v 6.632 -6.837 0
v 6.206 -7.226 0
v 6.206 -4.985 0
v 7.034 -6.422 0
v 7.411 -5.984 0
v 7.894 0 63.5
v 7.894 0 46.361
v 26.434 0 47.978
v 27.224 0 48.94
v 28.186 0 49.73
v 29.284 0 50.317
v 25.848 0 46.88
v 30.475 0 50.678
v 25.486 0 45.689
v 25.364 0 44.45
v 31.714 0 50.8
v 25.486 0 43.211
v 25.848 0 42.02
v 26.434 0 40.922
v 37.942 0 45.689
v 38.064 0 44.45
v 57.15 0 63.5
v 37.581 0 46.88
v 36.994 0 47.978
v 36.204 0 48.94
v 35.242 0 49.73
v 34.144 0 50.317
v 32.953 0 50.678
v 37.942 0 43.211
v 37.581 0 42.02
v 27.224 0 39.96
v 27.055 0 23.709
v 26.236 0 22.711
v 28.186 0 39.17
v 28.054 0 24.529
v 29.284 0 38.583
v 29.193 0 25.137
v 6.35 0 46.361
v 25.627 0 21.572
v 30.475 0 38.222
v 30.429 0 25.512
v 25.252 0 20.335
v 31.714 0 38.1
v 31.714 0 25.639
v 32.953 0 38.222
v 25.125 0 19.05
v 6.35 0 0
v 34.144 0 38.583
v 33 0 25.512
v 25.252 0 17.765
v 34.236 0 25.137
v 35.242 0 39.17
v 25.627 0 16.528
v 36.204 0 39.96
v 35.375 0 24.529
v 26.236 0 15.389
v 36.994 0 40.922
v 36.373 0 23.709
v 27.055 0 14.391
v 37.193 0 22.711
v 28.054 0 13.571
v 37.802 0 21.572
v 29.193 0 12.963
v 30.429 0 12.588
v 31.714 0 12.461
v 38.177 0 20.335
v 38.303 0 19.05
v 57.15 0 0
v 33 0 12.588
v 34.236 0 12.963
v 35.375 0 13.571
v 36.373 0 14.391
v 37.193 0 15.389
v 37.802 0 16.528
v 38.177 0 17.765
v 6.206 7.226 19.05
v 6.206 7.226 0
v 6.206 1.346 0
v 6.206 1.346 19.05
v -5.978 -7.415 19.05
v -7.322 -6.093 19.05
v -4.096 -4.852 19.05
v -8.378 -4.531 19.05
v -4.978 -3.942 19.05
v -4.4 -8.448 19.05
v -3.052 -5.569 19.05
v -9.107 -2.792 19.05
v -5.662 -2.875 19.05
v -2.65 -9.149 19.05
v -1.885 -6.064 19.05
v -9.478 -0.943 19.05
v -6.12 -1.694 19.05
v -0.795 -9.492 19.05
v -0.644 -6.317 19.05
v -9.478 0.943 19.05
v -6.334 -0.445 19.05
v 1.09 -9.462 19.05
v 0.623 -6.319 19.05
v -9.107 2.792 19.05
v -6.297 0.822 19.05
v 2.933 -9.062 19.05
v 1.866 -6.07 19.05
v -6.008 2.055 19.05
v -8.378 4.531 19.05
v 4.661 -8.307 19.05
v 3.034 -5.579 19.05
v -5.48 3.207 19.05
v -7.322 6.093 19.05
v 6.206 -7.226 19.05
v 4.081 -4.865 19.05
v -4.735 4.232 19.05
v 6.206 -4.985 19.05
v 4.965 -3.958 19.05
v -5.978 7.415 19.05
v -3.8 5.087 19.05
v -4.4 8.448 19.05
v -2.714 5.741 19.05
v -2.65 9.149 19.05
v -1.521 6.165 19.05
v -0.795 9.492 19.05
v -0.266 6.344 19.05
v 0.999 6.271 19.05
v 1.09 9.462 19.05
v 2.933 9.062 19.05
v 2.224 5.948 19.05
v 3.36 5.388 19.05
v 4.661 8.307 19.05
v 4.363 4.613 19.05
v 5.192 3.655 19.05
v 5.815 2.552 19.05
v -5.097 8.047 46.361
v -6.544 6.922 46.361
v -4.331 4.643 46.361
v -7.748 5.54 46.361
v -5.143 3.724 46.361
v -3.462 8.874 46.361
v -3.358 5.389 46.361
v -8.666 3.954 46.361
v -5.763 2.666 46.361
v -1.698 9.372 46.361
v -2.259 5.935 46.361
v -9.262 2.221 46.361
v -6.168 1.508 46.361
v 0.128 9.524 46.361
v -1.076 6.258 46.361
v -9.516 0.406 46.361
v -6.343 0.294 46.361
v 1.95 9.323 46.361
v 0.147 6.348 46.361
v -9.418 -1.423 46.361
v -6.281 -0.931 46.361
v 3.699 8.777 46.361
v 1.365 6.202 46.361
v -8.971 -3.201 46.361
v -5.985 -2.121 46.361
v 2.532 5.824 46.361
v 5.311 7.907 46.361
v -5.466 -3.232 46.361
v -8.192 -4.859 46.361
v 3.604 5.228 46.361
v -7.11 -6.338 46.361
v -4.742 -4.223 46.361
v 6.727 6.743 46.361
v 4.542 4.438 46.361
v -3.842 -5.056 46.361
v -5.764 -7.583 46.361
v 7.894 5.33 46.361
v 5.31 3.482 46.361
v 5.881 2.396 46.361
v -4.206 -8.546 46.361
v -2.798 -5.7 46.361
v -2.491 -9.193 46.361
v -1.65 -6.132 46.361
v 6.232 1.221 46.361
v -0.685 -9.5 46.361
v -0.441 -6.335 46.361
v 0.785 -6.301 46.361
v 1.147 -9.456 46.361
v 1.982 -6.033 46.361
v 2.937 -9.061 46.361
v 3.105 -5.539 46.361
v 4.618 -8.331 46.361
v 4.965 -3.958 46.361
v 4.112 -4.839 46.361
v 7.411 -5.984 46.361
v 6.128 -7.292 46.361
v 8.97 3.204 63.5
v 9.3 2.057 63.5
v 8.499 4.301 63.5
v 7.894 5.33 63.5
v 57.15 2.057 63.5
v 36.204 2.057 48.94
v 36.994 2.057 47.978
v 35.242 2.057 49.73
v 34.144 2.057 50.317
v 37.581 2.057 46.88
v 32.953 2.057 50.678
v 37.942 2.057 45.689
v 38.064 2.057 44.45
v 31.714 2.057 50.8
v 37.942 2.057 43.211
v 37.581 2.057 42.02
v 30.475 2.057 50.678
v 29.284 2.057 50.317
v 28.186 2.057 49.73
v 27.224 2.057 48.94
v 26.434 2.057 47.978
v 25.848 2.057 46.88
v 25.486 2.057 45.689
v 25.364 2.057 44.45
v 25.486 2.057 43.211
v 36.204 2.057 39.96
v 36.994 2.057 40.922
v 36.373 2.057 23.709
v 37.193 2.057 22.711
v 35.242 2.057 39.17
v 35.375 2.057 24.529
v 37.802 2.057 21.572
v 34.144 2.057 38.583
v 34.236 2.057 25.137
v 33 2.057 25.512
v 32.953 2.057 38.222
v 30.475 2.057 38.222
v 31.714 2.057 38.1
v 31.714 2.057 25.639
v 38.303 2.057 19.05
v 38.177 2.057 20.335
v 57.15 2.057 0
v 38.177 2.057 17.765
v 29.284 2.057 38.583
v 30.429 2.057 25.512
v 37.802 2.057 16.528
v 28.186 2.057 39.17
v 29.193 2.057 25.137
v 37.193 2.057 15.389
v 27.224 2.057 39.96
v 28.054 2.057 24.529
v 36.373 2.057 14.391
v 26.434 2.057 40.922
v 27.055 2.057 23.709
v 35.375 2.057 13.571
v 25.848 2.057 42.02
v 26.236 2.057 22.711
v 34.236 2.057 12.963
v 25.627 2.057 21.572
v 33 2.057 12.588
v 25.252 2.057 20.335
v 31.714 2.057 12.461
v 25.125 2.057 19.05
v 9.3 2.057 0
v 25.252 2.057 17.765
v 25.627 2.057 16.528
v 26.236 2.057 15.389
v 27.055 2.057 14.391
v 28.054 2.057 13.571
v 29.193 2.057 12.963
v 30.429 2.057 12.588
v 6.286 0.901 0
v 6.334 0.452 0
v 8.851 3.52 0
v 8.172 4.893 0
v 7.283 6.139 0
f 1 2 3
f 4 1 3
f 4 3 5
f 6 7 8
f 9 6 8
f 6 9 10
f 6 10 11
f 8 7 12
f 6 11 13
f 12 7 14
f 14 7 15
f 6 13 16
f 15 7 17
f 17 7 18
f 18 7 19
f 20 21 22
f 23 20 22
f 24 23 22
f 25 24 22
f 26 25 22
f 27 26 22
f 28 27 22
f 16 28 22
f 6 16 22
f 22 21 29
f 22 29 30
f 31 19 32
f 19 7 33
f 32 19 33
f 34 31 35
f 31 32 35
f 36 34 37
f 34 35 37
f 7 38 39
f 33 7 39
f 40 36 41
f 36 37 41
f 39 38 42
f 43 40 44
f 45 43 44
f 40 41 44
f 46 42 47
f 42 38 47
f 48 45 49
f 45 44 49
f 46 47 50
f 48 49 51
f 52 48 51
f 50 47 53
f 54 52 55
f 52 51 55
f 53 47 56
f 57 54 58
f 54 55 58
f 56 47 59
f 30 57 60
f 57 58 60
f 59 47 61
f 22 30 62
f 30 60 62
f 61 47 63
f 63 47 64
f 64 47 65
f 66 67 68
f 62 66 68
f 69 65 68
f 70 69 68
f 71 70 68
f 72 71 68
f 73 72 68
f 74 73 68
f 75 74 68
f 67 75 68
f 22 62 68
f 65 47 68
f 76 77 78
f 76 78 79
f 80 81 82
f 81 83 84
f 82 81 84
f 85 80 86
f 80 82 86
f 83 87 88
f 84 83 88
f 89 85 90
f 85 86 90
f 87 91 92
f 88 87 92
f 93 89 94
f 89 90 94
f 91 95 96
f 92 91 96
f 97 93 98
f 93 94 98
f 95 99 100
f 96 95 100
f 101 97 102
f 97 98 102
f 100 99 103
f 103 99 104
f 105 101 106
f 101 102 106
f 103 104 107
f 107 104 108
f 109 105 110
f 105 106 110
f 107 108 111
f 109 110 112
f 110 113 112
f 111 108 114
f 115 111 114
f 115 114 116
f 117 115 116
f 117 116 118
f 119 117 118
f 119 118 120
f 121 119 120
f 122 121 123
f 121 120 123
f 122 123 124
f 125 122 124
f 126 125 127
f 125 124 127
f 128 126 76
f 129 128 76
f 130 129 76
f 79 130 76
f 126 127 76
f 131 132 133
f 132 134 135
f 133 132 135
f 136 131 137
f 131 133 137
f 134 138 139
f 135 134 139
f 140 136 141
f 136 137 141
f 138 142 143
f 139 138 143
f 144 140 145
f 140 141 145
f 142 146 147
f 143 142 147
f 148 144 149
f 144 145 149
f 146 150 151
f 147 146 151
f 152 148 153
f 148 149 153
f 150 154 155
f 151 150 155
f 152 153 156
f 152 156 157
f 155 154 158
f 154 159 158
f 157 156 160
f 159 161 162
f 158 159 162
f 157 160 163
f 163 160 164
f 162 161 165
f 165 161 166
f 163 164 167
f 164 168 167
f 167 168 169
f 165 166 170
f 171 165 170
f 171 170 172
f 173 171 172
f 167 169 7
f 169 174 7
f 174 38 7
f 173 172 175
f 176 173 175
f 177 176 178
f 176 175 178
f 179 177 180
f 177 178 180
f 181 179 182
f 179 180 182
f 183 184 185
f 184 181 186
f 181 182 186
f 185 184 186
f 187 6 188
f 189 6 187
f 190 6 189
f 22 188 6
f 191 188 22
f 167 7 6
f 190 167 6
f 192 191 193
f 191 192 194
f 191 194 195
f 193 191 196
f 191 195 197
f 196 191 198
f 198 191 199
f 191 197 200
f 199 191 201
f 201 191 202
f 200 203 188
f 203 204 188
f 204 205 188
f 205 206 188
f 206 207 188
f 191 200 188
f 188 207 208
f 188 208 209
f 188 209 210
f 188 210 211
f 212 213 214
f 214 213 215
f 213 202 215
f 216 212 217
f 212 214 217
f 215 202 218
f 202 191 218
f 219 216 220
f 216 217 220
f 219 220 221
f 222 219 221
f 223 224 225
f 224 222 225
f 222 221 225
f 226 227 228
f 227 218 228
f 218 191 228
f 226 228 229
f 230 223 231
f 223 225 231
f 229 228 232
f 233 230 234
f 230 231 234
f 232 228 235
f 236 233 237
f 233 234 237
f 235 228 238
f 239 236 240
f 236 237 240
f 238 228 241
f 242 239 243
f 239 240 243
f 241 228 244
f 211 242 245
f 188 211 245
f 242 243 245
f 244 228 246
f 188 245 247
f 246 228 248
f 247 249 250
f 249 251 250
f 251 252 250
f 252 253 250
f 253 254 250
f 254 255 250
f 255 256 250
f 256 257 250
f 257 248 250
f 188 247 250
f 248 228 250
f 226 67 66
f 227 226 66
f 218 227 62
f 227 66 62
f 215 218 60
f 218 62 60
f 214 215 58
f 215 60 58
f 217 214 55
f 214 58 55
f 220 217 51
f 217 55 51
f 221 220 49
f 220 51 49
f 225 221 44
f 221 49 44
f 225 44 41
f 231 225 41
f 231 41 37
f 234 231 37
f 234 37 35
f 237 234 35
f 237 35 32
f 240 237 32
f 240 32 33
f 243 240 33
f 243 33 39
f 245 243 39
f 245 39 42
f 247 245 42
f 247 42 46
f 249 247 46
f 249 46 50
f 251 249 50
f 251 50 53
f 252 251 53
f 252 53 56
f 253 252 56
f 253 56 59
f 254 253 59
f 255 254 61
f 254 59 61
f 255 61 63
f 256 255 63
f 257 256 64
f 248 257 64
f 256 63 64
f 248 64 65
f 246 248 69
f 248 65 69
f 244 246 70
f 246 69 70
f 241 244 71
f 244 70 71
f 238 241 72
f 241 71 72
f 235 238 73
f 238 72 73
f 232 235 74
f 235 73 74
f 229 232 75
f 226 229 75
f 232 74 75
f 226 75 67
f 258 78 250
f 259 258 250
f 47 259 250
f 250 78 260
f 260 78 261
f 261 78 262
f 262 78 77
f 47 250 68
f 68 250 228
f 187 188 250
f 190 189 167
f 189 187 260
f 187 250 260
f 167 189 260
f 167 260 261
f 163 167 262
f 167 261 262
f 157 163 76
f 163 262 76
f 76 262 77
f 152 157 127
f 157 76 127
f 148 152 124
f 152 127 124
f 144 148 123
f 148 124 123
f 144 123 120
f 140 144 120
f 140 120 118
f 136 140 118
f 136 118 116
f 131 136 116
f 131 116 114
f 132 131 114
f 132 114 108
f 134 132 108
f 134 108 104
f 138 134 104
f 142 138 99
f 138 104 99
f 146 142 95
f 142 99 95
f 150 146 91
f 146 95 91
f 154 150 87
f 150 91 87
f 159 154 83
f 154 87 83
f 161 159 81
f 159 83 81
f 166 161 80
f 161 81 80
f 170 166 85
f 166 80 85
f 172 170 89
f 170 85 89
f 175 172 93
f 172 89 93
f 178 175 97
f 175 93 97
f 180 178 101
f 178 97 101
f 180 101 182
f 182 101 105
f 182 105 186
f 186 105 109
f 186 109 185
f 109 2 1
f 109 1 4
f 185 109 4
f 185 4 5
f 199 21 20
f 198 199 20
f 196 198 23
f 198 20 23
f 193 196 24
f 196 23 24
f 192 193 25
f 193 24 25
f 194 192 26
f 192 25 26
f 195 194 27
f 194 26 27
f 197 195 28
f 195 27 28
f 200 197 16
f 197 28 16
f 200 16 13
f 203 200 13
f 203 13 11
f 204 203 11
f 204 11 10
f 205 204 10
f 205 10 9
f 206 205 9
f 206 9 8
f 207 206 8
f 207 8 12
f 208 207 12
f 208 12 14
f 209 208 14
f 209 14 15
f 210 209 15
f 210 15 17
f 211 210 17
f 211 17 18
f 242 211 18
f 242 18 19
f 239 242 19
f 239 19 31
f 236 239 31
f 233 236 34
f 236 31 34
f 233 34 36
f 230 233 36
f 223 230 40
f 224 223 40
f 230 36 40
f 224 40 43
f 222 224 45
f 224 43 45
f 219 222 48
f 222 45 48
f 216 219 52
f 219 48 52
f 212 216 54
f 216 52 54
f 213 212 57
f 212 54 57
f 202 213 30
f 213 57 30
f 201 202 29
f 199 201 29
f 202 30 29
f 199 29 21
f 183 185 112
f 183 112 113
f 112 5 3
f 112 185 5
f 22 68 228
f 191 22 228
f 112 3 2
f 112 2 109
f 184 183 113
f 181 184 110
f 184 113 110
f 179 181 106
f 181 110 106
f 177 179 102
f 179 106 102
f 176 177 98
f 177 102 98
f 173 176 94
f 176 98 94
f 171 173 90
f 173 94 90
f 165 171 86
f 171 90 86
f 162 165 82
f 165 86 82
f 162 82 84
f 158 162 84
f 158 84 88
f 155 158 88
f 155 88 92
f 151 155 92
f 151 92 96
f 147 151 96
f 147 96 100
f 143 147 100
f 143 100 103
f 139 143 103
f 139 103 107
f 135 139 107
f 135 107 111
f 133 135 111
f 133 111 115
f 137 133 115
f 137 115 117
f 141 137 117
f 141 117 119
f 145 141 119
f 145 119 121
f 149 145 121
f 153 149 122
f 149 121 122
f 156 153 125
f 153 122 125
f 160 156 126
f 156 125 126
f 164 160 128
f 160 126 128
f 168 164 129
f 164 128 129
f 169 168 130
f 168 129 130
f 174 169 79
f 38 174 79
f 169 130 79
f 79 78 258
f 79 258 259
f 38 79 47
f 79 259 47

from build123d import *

# Parameters (mm, degrees)
F1_DEPTH = 63.5
F2_R     = 6.35
F2_R_2   = 6.589045
F3_DEPTH = 9.526
F4_W     = 29.302539
F4_H     = 19.05
F4_W_2   = 28.424359
F5_DEPTH = 12.7


with BuildPart() as f1:
    # F0 (on Top) → F1 (new body)
    with BuildSketch(Plane.XY):
        with BuildLine():
            ThreePointArc((4.965456, -3.958124), (-5.993878, 2.096646), (6.35, 0))
            Line((6.35, 0), (57.15, 0))
            Line((57.15, 0), (57.15, 2.05693))
            Line((57.15, 2.05693), (9.300251, 2.05693))
            ThreePointArc((9.300251, 2.05693), (-9.272442, 2.178863), (7.410832, -5.983744))
            Line((7.410832, -5.983744), (4.965456, -3.958124))
        make_face()
    extrude(amount=F1_DEPTH)

    # F2 (on face) → F3 (cut, through all)
    with BuildSketch(Plane.XZ):
        with Locations((31.714201, 44.45)):
            Circle(F2_R)
        with Locations((31.714201, 19.05)):
            Circle(F2_R_2)
    extrude(amount=-F3_DEPTH, mode=Mode.SUBTRACT)

    # F4 (on face) → F5 (cut, symmetric)
    with BuildSketch(Plane.XZ):
        with Locations((-8.445638, 9.525)):
            Rectangle(F4_W, F4_H)
        with Locations((-6.318135, 55.88594)):
            Rectangle(F4_W_2, F4_H)
    extrude(amount=F5_DEPTH, both=True, mode=Mode.SUBTRACT)


solid = f1.part
